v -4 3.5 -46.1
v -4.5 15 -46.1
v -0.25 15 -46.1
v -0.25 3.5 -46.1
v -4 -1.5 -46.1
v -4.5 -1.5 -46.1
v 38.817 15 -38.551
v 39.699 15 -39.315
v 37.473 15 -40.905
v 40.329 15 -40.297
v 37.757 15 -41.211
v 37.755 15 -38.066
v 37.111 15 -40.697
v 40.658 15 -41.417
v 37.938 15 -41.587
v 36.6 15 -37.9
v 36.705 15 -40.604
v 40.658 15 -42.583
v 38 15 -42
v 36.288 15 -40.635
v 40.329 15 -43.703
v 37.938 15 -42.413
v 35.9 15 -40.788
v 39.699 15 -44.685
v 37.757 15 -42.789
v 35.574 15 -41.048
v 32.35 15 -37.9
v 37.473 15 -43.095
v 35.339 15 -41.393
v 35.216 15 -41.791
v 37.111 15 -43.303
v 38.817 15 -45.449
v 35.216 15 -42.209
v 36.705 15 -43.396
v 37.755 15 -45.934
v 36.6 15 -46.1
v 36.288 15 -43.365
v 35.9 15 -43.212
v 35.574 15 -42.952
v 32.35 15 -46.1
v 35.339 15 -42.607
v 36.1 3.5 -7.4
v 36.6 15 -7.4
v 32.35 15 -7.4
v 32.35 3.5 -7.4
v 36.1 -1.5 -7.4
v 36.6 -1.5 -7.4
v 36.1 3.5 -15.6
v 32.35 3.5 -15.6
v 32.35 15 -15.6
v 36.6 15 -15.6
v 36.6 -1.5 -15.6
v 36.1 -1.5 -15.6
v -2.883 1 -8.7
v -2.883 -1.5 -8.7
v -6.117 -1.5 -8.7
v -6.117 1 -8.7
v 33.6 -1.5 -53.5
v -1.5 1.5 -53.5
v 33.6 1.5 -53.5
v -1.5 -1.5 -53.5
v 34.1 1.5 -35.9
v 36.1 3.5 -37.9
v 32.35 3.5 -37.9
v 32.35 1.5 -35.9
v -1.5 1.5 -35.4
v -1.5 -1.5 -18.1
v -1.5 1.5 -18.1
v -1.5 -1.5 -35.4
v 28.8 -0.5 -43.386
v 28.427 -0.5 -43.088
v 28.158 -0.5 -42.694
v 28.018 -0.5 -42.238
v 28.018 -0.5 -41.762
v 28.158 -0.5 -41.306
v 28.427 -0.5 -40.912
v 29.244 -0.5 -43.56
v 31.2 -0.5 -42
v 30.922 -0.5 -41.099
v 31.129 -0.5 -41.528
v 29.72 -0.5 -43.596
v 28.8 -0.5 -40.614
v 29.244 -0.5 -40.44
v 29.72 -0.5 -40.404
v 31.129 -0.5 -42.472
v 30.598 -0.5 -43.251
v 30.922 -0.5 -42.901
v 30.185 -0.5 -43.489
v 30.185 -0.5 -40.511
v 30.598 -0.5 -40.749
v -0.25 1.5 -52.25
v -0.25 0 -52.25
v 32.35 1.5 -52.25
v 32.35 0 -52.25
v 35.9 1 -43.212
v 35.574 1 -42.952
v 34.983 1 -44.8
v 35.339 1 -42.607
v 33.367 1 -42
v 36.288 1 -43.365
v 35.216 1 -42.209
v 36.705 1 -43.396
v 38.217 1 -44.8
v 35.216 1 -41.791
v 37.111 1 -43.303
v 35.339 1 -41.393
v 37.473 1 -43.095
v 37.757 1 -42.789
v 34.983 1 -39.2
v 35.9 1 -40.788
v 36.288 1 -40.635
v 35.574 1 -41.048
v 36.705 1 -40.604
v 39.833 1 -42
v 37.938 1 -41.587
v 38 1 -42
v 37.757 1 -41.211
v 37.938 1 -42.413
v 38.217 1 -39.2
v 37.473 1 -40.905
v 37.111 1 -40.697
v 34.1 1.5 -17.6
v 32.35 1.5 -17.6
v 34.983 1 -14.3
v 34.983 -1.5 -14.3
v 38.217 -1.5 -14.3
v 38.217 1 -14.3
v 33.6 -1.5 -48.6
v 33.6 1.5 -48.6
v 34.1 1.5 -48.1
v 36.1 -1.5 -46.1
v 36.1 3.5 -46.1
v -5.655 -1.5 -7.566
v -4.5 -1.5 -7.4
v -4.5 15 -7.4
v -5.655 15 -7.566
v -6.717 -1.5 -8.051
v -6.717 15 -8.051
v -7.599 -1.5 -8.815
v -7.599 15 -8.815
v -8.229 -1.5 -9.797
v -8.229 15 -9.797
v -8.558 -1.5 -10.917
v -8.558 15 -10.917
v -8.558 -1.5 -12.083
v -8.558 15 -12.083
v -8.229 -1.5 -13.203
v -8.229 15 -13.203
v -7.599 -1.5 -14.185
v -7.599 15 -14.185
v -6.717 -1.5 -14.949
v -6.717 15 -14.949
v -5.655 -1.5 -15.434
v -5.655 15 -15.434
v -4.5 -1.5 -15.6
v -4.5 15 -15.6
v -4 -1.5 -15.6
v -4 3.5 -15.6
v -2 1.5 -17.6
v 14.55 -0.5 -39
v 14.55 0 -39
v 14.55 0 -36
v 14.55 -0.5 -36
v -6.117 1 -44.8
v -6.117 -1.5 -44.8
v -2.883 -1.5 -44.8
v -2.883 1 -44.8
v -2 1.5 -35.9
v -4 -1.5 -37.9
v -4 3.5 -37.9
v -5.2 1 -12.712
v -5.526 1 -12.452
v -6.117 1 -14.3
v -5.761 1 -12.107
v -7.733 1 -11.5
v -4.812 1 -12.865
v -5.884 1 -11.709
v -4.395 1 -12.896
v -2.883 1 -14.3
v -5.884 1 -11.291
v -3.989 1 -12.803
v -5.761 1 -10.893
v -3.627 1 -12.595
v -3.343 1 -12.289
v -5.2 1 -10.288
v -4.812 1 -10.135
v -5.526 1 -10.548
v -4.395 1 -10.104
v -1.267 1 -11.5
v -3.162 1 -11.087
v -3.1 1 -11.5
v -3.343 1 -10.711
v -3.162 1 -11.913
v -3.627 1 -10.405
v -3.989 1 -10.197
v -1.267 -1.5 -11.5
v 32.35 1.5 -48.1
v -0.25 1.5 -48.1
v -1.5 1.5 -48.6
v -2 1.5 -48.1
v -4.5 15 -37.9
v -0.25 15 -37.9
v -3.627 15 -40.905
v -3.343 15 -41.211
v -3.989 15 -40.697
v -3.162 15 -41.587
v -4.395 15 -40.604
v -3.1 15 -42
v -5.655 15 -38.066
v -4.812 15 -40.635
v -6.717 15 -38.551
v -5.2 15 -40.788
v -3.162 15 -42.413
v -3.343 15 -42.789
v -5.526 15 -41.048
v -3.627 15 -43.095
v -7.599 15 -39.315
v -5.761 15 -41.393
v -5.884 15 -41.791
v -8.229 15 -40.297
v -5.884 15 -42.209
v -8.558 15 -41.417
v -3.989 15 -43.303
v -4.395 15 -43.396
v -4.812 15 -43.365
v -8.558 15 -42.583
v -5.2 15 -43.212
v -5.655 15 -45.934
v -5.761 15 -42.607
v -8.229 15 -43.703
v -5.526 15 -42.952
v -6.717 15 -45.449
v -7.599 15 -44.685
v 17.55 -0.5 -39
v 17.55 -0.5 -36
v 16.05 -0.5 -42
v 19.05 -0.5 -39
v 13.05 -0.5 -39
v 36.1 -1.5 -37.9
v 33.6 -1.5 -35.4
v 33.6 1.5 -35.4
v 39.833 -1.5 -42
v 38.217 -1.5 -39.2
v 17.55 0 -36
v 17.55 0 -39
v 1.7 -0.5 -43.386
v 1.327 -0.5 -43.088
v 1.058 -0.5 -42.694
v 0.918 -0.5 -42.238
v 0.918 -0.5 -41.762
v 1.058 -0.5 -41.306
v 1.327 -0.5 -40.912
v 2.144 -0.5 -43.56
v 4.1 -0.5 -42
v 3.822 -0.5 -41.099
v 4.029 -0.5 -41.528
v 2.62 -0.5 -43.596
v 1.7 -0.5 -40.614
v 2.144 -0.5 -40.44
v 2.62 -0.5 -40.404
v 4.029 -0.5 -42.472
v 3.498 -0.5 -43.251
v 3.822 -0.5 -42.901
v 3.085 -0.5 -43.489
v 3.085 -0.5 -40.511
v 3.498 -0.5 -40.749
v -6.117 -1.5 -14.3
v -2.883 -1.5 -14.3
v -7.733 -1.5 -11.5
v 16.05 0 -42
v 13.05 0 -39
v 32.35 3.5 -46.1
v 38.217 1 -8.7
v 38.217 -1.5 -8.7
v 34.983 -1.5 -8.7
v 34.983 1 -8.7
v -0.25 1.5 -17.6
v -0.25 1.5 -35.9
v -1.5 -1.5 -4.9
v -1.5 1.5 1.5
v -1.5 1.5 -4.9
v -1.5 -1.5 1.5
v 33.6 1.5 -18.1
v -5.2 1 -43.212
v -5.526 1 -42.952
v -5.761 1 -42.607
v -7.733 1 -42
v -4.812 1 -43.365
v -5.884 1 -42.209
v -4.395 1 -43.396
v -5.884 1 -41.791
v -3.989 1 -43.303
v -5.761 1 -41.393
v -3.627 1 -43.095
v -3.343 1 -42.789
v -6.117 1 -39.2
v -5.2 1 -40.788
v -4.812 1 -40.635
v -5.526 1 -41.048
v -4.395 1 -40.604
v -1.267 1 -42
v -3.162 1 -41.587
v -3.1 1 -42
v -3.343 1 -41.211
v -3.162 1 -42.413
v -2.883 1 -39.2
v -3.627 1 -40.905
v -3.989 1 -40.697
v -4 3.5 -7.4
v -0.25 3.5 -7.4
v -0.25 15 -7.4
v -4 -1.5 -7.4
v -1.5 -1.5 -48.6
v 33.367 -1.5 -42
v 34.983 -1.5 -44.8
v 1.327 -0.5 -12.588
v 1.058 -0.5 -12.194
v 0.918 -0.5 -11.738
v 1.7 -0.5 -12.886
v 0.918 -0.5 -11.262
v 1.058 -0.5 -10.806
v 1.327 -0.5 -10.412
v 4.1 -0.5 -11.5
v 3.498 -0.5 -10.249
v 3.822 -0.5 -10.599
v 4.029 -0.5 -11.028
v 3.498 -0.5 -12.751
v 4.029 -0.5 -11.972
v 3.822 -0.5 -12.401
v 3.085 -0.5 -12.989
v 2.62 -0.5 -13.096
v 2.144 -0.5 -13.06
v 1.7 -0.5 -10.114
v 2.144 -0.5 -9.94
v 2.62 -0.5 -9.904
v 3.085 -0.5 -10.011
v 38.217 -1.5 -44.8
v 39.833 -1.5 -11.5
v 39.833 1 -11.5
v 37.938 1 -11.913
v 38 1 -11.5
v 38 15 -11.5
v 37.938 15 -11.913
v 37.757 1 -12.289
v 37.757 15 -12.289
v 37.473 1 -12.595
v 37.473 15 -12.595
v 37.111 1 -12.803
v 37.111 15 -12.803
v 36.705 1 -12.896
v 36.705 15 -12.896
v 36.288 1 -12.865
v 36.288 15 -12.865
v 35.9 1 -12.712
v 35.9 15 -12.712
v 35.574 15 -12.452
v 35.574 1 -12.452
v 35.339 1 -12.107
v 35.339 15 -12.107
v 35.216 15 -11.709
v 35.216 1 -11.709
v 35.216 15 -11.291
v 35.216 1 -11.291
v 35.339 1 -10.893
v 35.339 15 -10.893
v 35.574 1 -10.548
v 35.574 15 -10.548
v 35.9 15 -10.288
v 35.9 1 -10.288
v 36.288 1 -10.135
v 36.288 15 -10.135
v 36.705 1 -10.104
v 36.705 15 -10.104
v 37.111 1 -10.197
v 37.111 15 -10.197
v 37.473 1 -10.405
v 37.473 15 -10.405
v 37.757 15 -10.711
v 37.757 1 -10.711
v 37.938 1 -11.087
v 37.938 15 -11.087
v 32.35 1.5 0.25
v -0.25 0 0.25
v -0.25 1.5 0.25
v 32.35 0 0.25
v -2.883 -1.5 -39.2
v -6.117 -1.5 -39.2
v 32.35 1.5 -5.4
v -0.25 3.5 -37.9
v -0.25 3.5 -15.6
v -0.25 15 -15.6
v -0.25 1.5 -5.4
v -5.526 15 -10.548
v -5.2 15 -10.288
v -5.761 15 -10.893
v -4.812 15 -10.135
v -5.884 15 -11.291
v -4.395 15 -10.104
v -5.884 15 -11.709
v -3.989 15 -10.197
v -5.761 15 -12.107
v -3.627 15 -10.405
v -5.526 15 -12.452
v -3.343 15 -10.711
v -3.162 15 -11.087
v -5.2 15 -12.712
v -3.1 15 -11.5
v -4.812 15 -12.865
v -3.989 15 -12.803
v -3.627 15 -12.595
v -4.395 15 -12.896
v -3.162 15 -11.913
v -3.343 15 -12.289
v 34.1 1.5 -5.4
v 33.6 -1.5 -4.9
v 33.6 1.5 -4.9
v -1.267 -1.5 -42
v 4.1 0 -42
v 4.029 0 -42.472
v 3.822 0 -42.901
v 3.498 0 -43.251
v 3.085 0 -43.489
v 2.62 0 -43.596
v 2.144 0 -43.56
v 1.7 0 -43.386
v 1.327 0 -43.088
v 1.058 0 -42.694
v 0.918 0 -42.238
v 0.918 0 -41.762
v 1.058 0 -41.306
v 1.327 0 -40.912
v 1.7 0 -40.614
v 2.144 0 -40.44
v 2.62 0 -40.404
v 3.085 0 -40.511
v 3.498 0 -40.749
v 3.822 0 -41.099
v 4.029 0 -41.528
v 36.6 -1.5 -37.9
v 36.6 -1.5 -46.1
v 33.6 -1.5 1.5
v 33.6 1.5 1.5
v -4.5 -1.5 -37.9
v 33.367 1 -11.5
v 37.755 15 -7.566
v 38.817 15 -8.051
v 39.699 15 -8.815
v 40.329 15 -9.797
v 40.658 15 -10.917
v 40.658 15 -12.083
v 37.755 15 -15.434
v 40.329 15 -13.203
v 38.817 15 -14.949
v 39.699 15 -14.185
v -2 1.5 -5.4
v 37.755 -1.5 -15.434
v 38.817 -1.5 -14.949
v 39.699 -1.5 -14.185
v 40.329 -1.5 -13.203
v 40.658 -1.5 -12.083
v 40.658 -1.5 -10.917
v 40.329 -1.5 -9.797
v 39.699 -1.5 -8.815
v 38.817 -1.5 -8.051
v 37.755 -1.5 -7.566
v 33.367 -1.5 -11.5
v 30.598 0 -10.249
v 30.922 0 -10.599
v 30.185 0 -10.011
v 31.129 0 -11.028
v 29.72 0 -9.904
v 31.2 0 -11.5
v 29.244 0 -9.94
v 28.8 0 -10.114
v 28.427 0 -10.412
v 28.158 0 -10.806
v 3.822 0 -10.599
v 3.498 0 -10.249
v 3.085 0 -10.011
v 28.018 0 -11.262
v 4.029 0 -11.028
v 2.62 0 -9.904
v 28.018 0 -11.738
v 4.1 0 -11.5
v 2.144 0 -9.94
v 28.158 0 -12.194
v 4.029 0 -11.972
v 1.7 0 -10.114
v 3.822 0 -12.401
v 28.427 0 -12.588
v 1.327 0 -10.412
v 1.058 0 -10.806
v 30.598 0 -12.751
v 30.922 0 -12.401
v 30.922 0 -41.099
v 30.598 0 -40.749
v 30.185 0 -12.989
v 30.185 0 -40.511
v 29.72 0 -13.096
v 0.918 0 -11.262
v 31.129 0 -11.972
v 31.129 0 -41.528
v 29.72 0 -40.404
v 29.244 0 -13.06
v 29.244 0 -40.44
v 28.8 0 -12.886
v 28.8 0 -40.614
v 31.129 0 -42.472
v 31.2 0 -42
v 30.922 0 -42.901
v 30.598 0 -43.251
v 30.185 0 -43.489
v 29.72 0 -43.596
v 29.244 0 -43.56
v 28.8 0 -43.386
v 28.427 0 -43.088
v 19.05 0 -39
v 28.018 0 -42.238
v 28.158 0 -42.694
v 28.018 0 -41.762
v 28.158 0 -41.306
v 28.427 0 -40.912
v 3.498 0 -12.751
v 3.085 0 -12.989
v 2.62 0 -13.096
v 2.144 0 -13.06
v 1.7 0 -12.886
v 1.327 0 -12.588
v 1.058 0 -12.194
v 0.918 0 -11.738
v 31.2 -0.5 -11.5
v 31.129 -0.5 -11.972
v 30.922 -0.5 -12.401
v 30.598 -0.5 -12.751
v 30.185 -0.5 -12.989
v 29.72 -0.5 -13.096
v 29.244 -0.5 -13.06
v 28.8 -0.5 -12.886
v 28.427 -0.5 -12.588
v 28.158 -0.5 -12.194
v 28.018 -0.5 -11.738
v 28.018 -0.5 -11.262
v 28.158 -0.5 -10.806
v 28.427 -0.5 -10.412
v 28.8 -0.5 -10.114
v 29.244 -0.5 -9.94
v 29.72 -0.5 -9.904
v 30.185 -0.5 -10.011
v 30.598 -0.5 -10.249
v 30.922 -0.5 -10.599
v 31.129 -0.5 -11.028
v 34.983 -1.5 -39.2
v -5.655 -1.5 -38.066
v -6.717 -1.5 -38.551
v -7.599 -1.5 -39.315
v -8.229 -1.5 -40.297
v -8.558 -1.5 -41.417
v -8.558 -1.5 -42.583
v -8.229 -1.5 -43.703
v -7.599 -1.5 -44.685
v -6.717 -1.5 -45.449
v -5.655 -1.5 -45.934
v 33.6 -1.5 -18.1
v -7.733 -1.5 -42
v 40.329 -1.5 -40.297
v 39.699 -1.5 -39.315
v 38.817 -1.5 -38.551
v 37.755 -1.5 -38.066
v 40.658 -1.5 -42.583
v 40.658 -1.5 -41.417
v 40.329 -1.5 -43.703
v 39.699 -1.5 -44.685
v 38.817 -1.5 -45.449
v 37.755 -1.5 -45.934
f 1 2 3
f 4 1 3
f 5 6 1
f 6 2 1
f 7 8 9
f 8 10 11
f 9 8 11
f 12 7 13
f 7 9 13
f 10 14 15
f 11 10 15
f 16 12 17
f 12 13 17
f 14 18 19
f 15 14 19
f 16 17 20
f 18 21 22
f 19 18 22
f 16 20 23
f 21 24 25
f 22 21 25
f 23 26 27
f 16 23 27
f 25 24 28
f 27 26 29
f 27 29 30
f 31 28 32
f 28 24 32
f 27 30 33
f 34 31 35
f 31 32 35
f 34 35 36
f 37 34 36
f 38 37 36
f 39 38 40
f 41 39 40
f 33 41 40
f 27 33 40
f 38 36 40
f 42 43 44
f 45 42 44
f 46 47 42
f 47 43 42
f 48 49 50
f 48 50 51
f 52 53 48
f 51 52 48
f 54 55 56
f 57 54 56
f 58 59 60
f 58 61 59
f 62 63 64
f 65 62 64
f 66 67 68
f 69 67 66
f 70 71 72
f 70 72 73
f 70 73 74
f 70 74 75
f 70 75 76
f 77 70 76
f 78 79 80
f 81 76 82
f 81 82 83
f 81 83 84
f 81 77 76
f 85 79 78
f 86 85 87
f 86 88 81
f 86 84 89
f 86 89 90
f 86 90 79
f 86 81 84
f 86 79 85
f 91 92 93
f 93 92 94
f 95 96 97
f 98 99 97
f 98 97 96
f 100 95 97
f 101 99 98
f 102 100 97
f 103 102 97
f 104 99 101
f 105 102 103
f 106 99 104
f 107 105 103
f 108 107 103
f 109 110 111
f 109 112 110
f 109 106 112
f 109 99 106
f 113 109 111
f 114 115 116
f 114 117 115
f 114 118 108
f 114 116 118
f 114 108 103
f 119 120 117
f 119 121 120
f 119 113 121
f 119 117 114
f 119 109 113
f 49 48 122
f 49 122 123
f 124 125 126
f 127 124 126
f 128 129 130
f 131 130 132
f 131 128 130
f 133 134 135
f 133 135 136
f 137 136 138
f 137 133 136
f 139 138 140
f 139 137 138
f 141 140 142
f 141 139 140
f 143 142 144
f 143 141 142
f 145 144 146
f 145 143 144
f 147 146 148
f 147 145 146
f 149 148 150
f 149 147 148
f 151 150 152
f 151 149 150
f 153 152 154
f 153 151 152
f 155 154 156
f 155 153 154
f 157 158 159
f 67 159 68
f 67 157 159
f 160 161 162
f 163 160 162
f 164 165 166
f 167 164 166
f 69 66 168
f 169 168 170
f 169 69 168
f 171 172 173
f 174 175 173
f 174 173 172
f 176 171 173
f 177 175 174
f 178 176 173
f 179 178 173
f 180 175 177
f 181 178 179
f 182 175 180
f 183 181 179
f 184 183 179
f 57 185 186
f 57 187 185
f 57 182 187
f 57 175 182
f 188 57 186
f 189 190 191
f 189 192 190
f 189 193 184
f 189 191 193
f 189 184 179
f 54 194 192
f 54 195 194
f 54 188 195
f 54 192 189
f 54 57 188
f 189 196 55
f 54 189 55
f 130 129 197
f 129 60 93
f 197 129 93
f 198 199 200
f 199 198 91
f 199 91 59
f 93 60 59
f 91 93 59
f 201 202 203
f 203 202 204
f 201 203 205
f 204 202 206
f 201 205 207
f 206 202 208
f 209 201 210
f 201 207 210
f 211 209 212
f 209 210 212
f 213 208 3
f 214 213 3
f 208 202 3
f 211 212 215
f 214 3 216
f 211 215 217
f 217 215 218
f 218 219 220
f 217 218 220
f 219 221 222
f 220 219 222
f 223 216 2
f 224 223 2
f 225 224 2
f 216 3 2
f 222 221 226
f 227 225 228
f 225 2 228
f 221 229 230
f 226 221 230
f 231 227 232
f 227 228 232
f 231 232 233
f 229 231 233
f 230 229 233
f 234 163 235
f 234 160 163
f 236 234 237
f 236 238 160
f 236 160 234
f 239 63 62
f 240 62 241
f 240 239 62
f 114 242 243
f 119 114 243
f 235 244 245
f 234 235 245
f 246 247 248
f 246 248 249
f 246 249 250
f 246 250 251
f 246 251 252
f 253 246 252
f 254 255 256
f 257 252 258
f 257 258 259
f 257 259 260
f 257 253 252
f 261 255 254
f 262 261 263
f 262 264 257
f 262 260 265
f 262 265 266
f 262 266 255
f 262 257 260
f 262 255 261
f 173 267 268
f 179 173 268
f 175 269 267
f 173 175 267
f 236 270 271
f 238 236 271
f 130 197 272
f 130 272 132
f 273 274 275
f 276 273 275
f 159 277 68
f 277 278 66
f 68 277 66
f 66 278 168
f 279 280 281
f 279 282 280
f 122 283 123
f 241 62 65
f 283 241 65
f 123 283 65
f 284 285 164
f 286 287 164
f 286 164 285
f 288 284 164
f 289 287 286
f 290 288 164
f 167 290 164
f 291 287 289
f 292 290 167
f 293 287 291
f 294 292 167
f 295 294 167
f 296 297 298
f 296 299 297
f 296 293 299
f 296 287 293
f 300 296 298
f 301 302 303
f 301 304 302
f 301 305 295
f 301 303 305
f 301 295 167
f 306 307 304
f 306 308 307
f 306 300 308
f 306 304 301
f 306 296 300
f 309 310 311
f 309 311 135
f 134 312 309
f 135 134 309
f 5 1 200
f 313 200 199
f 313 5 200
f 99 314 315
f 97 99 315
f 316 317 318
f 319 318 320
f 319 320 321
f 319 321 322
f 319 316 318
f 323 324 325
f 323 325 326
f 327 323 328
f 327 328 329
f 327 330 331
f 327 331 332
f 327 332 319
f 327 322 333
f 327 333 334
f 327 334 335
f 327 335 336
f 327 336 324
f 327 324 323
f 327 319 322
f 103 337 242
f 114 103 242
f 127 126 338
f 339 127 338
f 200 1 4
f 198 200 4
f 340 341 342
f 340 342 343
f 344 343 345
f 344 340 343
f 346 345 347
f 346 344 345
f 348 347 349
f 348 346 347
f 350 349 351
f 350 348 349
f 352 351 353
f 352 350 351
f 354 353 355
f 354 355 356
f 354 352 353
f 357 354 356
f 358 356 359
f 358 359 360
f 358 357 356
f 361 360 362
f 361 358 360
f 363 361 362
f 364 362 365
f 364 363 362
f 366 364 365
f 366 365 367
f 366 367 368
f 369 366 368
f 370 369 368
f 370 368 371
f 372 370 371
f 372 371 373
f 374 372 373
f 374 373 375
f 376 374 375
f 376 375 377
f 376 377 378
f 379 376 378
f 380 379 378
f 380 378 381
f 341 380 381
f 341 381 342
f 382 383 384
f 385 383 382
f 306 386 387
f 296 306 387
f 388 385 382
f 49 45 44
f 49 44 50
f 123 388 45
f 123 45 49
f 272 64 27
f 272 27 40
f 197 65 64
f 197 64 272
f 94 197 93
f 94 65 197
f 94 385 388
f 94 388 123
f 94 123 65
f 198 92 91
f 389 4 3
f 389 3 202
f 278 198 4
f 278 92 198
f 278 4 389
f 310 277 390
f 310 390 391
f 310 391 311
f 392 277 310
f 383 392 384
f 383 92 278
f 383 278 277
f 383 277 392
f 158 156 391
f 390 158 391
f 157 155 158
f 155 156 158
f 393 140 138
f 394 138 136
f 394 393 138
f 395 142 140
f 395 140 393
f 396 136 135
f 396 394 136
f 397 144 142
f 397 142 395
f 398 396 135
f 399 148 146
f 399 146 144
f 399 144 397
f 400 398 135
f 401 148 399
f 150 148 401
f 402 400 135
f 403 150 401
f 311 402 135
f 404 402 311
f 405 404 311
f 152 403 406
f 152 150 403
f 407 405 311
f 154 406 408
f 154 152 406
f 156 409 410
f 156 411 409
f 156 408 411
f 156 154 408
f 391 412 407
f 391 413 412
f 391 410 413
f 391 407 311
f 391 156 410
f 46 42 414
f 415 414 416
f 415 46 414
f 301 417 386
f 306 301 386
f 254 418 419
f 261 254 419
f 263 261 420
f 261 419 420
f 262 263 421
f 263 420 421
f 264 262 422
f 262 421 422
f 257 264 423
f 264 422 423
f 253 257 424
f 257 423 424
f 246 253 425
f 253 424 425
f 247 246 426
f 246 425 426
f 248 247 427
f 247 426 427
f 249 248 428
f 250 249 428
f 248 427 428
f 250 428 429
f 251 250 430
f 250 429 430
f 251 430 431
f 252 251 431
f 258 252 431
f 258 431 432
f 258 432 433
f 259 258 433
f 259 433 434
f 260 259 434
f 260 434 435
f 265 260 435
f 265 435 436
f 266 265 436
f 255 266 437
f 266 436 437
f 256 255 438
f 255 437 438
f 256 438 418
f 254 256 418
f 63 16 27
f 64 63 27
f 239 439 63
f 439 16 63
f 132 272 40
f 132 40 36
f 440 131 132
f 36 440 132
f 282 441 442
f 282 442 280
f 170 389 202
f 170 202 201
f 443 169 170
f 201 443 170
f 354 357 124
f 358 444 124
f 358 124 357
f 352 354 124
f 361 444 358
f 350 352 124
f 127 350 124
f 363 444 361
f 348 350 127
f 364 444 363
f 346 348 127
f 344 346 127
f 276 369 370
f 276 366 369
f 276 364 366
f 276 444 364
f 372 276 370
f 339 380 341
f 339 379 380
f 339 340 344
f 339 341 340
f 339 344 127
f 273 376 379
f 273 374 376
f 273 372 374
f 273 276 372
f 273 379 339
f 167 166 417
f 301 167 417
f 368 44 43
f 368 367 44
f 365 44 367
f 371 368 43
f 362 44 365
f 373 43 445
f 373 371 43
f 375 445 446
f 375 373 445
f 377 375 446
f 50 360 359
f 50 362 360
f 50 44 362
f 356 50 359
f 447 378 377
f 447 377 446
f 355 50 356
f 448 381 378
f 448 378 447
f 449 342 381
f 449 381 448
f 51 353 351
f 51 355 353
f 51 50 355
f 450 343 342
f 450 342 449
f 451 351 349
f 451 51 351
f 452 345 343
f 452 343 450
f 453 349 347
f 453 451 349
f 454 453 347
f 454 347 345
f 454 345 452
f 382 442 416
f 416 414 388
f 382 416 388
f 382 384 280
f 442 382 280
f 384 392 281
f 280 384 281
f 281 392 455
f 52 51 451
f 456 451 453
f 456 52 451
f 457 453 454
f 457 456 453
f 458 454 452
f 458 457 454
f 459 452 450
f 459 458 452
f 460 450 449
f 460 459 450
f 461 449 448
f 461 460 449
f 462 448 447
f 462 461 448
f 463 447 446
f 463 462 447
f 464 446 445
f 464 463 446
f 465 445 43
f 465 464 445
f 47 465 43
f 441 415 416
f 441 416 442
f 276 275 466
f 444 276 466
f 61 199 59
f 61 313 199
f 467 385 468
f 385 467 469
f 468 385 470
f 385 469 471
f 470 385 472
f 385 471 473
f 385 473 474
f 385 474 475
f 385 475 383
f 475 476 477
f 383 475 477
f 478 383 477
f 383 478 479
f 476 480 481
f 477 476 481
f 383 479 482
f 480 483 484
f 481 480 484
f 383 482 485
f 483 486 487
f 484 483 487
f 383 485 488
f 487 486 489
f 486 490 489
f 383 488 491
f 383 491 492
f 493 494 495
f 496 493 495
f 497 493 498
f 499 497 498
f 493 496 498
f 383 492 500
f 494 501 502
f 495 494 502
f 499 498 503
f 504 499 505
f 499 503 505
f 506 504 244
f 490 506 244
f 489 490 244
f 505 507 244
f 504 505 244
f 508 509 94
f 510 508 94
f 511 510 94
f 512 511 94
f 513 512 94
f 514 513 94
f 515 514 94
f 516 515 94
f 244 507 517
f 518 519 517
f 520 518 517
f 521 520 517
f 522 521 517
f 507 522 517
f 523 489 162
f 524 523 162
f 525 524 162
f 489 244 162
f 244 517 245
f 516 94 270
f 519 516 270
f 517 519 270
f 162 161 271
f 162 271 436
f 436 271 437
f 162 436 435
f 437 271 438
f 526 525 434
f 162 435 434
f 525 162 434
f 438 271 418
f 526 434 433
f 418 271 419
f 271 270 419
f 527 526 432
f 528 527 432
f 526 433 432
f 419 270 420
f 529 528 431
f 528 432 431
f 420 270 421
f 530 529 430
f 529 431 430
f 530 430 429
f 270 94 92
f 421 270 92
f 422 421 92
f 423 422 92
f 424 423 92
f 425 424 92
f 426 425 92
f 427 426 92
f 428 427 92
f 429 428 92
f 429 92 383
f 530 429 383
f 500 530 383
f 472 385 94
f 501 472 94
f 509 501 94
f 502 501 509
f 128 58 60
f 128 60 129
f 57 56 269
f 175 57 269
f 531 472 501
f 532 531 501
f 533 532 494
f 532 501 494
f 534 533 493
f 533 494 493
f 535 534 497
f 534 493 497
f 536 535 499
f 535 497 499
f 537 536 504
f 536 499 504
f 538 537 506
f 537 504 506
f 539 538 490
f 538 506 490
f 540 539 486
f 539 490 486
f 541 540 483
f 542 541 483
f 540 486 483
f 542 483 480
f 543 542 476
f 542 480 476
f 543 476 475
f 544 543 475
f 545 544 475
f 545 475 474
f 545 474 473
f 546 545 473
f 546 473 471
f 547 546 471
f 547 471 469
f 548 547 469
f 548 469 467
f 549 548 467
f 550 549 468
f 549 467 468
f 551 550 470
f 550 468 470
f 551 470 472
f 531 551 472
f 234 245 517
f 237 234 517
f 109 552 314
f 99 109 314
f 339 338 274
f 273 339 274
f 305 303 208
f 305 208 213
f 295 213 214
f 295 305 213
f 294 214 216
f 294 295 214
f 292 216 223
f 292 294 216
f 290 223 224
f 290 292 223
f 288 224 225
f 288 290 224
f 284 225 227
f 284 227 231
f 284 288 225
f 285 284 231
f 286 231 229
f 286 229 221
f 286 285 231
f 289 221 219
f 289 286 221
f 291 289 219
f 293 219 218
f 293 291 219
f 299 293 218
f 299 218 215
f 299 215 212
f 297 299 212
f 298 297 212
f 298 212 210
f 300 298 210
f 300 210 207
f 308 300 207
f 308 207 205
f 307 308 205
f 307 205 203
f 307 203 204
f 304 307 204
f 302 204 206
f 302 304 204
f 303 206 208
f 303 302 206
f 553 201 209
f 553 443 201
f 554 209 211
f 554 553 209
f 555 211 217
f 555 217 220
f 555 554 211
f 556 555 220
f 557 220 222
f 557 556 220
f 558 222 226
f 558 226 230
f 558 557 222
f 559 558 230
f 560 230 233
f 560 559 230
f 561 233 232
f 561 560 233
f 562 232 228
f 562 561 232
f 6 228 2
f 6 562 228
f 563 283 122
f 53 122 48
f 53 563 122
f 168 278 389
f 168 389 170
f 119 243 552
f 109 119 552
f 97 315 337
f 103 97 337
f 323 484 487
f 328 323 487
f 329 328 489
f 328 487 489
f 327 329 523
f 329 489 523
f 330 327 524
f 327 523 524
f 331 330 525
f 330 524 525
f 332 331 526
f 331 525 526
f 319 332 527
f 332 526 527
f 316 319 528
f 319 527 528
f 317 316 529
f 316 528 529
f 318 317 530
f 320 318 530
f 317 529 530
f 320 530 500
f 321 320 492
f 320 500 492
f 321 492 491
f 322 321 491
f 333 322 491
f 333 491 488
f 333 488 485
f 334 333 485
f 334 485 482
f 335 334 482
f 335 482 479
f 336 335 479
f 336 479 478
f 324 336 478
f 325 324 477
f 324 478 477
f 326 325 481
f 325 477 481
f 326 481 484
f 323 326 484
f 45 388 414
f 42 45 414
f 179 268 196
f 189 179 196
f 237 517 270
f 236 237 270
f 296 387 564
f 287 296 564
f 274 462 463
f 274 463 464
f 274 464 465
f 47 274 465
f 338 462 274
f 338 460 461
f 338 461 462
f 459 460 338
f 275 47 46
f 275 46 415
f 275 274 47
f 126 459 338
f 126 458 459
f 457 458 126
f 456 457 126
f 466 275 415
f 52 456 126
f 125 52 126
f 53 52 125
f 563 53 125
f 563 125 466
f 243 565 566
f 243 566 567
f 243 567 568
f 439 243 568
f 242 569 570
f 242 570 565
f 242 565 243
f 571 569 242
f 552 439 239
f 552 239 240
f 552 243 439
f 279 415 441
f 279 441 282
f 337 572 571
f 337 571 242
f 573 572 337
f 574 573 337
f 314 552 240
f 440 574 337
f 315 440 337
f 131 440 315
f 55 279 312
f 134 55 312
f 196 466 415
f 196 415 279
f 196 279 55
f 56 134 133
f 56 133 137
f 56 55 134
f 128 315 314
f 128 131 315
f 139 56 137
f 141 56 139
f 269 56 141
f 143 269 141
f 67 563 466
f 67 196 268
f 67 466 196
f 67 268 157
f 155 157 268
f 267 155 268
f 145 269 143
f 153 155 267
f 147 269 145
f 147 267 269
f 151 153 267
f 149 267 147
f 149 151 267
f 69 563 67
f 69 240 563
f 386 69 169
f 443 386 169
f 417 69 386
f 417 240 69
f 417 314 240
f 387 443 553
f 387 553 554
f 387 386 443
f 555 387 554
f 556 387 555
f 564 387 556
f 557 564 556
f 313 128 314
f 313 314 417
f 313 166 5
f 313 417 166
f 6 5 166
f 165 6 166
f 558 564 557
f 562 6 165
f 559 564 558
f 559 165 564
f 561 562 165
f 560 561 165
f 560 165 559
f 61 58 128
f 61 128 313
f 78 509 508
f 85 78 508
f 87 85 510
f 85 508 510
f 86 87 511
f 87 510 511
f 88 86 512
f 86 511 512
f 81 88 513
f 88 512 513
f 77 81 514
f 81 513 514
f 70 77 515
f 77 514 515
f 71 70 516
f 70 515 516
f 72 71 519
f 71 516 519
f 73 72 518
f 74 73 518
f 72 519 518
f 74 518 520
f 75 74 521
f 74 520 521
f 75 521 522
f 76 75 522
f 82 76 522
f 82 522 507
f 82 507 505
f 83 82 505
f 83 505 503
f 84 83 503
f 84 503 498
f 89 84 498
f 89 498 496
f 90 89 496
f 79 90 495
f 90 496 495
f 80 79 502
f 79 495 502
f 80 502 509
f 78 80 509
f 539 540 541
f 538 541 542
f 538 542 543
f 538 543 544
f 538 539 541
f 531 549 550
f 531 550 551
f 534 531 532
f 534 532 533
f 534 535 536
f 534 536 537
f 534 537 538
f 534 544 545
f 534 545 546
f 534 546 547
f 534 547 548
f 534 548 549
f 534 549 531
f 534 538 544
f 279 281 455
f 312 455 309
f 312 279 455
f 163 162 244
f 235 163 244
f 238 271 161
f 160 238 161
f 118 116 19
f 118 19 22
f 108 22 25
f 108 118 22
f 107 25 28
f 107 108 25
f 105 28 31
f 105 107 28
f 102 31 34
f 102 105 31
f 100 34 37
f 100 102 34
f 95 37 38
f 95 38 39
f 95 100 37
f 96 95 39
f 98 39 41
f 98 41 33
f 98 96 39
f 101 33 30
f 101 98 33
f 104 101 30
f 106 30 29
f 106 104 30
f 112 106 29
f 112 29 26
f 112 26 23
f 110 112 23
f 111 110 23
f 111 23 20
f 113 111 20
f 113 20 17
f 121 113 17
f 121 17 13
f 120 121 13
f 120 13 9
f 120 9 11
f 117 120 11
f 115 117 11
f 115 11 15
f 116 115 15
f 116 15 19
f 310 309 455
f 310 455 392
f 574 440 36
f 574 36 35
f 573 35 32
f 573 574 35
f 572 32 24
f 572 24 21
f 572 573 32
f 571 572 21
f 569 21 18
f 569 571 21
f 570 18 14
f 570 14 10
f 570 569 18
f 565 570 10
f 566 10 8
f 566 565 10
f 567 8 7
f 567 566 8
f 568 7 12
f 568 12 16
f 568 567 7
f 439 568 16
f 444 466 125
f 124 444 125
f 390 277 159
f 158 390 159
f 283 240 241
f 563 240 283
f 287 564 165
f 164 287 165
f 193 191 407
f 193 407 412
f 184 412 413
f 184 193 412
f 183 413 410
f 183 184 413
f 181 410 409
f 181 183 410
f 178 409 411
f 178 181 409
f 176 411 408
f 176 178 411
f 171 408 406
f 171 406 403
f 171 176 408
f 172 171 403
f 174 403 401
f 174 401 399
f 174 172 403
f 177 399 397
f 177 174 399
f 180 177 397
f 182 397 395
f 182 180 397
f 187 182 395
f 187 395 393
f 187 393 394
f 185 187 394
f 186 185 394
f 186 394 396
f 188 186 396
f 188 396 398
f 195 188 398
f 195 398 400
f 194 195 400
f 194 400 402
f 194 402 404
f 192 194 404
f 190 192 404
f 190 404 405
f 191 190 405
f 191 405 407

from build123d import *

# Parameters (mm, degrees)
SKETCH2_R               = 1.4
BOSS_EXTRUDE1_DEPTH     = 1.5
SKETCH5_R               = 1.6
CUT_EXTRUDE1_DEPTH      = 0.5
SKETCH3_R               = 1.4
SKETCH3_W               = 32.6
SKETCH3_H               = 52.5
BOSS_EXTRUDE2_DEPTH     = 1.5
SKETCH4_R               = 1.4
BOSS_EXTRUDE3_DEPTH     = 13.5
CHAMFER1_SIZE           = 2
CUT_EXTRUDE2_DEPTH      = 1
CUT_EXTRUDE2_DEPTH_BACK = 2.5


with BuildPart() as part:
    # Sketch2 → Boss-Extrude1 (new body)
    with BuildSketch(Plane(origin=(0, 0, 0), x_dir=(1, 0, 0), z_dir=(0, 1, 0))):
        with BuildLine():
            Line((-1.5, -1.5), (-1.5, 4.9))
            Line((-1.5, 4.9), (-4, 7.4))
            Line((-4, 7.4), (-4.5, 7.4))
            ThreePointArc((-4.5, 7.4), (-8.6, 11.5), (-4.5, 15.6))
            Line((-4.5, 15.6), (-4, 15.6))
            Line((-4, 15.6), (-1.5, 18.1))
            Line((-1.5, 18.1), (-1.5, 35.4))
            Line((-1.5, 35.4), (-4, 37.9))
            Line((-4, 37.9), (-4.5, 37.9))
            ThreePointArc((-4.5, 37.9), (-8.6, 42), (-4.5, 46.1))
            Line((-4.5, 46.1), (-4, 46.1))
            Line((-4, 46.1), (-1.5, 48.6))
            Line((-1.5, 48.6), (-1.5, 53.5))
            Line((-1.5, 53.5), (33.6, 53.5))
            Line((33.6, 53.5), (33.6, 48.6))
            Line((33.6, 48.6), (36.1, 46.1))
            Line((36.1, 46.1), (36.6, 46.1))
            ThreePointArc((36.6, 46.1), (40.7, 42), (36.6, 37.9))
            Line((36.6, 37.9), (36.1, 37.9))
            Line((36.1, 37.9), (33.6, 35.4))
            Line((33.6, 35.4), (33.6, 18.1))
            Line((33.6, 18.1), (36.1, 15.6))
            Line((36.1, 15.6), (36.6, 15.6))
            ThreePointArc((36.6, 15.6), (40.7, 11.5), (36.6, 7.4))
            Line((36.6, 7.4), (36.1, 7.4))
            Line((36.1, 7.4), (33.6, 4.9))
            Line((33.6, 4.9), (33.6, -1.5))
            Line((33.6, -1.5), (-1.5, -1.5))
        make_face()
        with Locations((-4.5, 42)):
            Circle(SKETCH2_R, mode=Mode.SUBTRACT)
        with Locations((-4.5, 11.5)):
            Circle(SKETCH2_R, mode=Mode.SUBTRACT)
        with Locations((36.6, 11.5)):
            Circle(SKETCH2_R, mode=Mode.SUBTRACT)
        with Locations((36.6, 42)):
            Circle(SKETCH2_R, mode=Mode.SUBTRACT)
    extrude(amount=-BOSS_EXTRUDE1_DEPTH)

    # Sketch5 → Cut-Extrude1 (cut)
    with BuildSketch(Plane(origin=(0, 0, 0), x_dir=(1, 0, 0), z_dir=(0, 1, 0))):
        with Locations((2.5, 42)):
            Circle(SKETCH5_R)
        with Locations((29.6, 42)):
            Circle(SKETCH5_R)
        with Locations((29.6, 11.5)):
            Circle(SKETCH5_R)
        with Locations((2.5, 11.5)):
            Circle(SKETCH5_R)
        Polygon((14.55, 36), (17.55, 36), (17.55, 39), (19.05, 39), (16.05, 42), (13.05, 39), (14.55, 39), align=None)
    extrude(amount=-CUT_EXTRUDE1_DEPTH, mode=Mode.SUBTRACT)

    # Sketch3 → Boss-Extrude2 (add)
    with BuildSketch(Plane(origin=(0, 0, 0), x_dir=(1, 0, 0), z_dir=(0, 1, 0))):
        with BuildLine():
            Line((-1.5, 53.5), (33.6, 53.5))
            Line((33.6, 53.5), (33.6, 48.6))
            Line((33.6, 48.6), (36.1, 46.1))
            Line((36.1, 46.1), (36.6, 46.1))
            ThreePointArc((36.6, 46.1), (40.7, 42), (36.6, 37.9))
            Line((36.6, 37.9), (36.1, 37.9))
            Line((36.1, 37.9), (33.6, 35.4))
            Line((33.6, 35.4), (33.6, 18.1))
            Line((33.6, 18.1), (36.1, 15.6))
            Line((36.1, 15.6), (36.6, 15.6))
            ThreePointArc((36.6, 15.6), (40.7, 11.5), (36.6, 7.4))
            Line((36.6, 7.4), (36.1, 7.4))
            Line((36.1, 7.4), (33.6, 4.9))
            Line((33.6, 4.9), (33.6, -1.5))
            Line((33.6, -1.5), (-1.5, -1.5))
            Line((-1.5, -1.5), (-1.5, 4.9))
            Line((-1.5, 4.9), (-4, 7.4))
            Line((-4, 7.4), (-4.5, 7.4))
            ThreePointArc((-4.5, 7.4), (-8.6, 11.5), (-4.5, 15.6))
            Line((-4.5, 15.6), (-4, 15.6))
            Line((-4, 15.6), (-1.5, 18.1))
            Line((-1.5, 18.1), (-1.5, 35.4))
            Line((-1.5, 35.4), (-4, 37.9))
            Line((-4, 37.9), (-4.5, 37.9))
            ThreePointArc((-4.5, 37.9), (-8.6, 42), (-4.5, 46.1))
            Line((-4.5, 46.1), (-4, 46.1))
            Line((-4, 46.1), (-1.5, 48.6))
            Line((-1.5, 48.6), (-1.5, 53.5))
        make_face()
        with Locations((-4.5, 42)):
            Circle(SKETCH3_R, mode=Mode.SUBTRACT)
        with Locations((36.6, 42)):
            Circle(SKETCH3_R, mode=Mode.SUBTRACT)
        with Locations((36.6, 11.5)):
            Circle(SKETCH3_R, mode=Mode.SUBTRACT)
        with Locations((-4.5, 11.5)):
            Circle(SKETCH3_R, mode=Mode.SUBTRACT)
        with Locations((16.05, 26)):
            Rectangle(SKETCH3_W, SKETCH3_H, mode=Mode.SUBTRACT)
    extrude(amount=BOSS_EXTRUDE2_DEPTH)

    # Sketch4 → Boss-Extrude3 (add)
    with BuildSketch(Plane(origin=(0, 1.5, 0), x_dir=(1, 0, 0), z_dir=(0, 1, 0))):
        with BuildLine():
            Line((-4.5, 46.1), (-0.25, 46.1))
            Line((-0.25, 46.1), (-0.25, 37.9))
            Line((-0.25, 37.9), (-4.5, 37.9))
            ThreePointArc((-4.5, 37.9), (-8.6, 42), (-4.5, 46.1))
        make_face()
        with Locations((-4.5, 42)):
            Circle(SKETCH4_R, mode=Mode.SUBTRACT)
        with BuildLine():
            Line((-4.5, 7.4), (-0.25, 7.4))
            Line((-0.25, 7.4), (-0.25, 15.6))
            Line((-0.25, 15.6), (-4.5, 15.6))
            ThreePointArc((-4.5, 15.6), (-8.6, 11.5), (-4.5, 7.4))
        make_face()
        with Locations((-4.5, 11.5)):
            Circle(SKETCH4_R, mode=Mode.SUBTRACT)
        with BuildLine():
            Line((32.35, 15.6), (32.35, 7.4))
            Line((32.35, 7.4), (36.6, 7.4))
            ThreePointArc((36.6, 7.4), (40.7, 11.5), (36.6, 15.6))
            Line((36.6, 15.6), (32.35, 15.6))
        make_face()
        with Locations((36.6, 11.5)):
            Circle(SKETCH4_R, mode=Mode.SUBTRACT)
        with BuildLine():
            Line((32.35, 46.1), (36.6, 46.1))
            ThreePointArc((36.6, 46.1), (40.7, 42), (36.6, 37.9))
            Line((36.6, 37.9), (32.35, 37.9))
            Line((32.35, 37.9), (32.35, 46.1))
        make_face()
        with Locations((36.6, 42)):
            Circle(SKETCH4_R, mode=Mode.SUBTRACT)
    extrude(amount=BOSS_EXTRUDE3_DEPTH)

    # Chamfer1
    chamfer1_edges = [part.edges().sort_by_distance(p)[0] for p in [
        (34.225, 1.5, -37.9),
        (34.225, 1.5, -46.1),
        (34.225, 1.5, -15.6),
        (34.225, 1.5, -7.4),
        (-2.125, 1.5, -7.4),
        (-2.125, 1.5, -15.6),
        (-2.125, 1.5, -37.9),
        (-2.125, 1.5, -46.1),
    ]]
    chamfer(chamfer1_edges, length=CHAMFER1_SIZE)

    # Sketch6 → Cut-Extrude2 (cut, two sides)
    with BuildSketch(Plane.XZ.offset(1.5)) as cut_extrude2_sk:
        Polygon((-1.266838493, -42), (-2.883419246, -39.2), (-6.116580754, -39.2), (-7.733161507, -42), (-6.116580754, -44.8), (-2.883419246, -44.8), align=None)
        Polygon((33.366838493, -42), (34.983419246, -44.8), (38.216580754, -44.8), (39.833161507, -42), (38.216580754, -39.2), (34.983419246, -39.2), align=None)
        Polygon((-1.266838493, -11.5), (-2.883419246, -8.7), (-6.116580754, -8.7), (-7.733161507, -11.5), (-6.116580754, -14.3), (-2.883419246, -14.3), align=None)
        Polygon((33.366838493, -11.5), (34.983419246, -14.3), (38.216580754, -14.3), (39.833161507, -11.5), (38.216580754, -8.7), (34.983419246, -8.7), align=None)
    extrude(amount=CUT_EXTRUDE2_DEPTH, mode=Mode.SUBTRACT)
    extrude(cut_extrude2_sk.sketch, amount=-CUT_EXTRUDE2_DEPTH_BACK, mode=Mode.SUBTRACT)


solid = part.part
